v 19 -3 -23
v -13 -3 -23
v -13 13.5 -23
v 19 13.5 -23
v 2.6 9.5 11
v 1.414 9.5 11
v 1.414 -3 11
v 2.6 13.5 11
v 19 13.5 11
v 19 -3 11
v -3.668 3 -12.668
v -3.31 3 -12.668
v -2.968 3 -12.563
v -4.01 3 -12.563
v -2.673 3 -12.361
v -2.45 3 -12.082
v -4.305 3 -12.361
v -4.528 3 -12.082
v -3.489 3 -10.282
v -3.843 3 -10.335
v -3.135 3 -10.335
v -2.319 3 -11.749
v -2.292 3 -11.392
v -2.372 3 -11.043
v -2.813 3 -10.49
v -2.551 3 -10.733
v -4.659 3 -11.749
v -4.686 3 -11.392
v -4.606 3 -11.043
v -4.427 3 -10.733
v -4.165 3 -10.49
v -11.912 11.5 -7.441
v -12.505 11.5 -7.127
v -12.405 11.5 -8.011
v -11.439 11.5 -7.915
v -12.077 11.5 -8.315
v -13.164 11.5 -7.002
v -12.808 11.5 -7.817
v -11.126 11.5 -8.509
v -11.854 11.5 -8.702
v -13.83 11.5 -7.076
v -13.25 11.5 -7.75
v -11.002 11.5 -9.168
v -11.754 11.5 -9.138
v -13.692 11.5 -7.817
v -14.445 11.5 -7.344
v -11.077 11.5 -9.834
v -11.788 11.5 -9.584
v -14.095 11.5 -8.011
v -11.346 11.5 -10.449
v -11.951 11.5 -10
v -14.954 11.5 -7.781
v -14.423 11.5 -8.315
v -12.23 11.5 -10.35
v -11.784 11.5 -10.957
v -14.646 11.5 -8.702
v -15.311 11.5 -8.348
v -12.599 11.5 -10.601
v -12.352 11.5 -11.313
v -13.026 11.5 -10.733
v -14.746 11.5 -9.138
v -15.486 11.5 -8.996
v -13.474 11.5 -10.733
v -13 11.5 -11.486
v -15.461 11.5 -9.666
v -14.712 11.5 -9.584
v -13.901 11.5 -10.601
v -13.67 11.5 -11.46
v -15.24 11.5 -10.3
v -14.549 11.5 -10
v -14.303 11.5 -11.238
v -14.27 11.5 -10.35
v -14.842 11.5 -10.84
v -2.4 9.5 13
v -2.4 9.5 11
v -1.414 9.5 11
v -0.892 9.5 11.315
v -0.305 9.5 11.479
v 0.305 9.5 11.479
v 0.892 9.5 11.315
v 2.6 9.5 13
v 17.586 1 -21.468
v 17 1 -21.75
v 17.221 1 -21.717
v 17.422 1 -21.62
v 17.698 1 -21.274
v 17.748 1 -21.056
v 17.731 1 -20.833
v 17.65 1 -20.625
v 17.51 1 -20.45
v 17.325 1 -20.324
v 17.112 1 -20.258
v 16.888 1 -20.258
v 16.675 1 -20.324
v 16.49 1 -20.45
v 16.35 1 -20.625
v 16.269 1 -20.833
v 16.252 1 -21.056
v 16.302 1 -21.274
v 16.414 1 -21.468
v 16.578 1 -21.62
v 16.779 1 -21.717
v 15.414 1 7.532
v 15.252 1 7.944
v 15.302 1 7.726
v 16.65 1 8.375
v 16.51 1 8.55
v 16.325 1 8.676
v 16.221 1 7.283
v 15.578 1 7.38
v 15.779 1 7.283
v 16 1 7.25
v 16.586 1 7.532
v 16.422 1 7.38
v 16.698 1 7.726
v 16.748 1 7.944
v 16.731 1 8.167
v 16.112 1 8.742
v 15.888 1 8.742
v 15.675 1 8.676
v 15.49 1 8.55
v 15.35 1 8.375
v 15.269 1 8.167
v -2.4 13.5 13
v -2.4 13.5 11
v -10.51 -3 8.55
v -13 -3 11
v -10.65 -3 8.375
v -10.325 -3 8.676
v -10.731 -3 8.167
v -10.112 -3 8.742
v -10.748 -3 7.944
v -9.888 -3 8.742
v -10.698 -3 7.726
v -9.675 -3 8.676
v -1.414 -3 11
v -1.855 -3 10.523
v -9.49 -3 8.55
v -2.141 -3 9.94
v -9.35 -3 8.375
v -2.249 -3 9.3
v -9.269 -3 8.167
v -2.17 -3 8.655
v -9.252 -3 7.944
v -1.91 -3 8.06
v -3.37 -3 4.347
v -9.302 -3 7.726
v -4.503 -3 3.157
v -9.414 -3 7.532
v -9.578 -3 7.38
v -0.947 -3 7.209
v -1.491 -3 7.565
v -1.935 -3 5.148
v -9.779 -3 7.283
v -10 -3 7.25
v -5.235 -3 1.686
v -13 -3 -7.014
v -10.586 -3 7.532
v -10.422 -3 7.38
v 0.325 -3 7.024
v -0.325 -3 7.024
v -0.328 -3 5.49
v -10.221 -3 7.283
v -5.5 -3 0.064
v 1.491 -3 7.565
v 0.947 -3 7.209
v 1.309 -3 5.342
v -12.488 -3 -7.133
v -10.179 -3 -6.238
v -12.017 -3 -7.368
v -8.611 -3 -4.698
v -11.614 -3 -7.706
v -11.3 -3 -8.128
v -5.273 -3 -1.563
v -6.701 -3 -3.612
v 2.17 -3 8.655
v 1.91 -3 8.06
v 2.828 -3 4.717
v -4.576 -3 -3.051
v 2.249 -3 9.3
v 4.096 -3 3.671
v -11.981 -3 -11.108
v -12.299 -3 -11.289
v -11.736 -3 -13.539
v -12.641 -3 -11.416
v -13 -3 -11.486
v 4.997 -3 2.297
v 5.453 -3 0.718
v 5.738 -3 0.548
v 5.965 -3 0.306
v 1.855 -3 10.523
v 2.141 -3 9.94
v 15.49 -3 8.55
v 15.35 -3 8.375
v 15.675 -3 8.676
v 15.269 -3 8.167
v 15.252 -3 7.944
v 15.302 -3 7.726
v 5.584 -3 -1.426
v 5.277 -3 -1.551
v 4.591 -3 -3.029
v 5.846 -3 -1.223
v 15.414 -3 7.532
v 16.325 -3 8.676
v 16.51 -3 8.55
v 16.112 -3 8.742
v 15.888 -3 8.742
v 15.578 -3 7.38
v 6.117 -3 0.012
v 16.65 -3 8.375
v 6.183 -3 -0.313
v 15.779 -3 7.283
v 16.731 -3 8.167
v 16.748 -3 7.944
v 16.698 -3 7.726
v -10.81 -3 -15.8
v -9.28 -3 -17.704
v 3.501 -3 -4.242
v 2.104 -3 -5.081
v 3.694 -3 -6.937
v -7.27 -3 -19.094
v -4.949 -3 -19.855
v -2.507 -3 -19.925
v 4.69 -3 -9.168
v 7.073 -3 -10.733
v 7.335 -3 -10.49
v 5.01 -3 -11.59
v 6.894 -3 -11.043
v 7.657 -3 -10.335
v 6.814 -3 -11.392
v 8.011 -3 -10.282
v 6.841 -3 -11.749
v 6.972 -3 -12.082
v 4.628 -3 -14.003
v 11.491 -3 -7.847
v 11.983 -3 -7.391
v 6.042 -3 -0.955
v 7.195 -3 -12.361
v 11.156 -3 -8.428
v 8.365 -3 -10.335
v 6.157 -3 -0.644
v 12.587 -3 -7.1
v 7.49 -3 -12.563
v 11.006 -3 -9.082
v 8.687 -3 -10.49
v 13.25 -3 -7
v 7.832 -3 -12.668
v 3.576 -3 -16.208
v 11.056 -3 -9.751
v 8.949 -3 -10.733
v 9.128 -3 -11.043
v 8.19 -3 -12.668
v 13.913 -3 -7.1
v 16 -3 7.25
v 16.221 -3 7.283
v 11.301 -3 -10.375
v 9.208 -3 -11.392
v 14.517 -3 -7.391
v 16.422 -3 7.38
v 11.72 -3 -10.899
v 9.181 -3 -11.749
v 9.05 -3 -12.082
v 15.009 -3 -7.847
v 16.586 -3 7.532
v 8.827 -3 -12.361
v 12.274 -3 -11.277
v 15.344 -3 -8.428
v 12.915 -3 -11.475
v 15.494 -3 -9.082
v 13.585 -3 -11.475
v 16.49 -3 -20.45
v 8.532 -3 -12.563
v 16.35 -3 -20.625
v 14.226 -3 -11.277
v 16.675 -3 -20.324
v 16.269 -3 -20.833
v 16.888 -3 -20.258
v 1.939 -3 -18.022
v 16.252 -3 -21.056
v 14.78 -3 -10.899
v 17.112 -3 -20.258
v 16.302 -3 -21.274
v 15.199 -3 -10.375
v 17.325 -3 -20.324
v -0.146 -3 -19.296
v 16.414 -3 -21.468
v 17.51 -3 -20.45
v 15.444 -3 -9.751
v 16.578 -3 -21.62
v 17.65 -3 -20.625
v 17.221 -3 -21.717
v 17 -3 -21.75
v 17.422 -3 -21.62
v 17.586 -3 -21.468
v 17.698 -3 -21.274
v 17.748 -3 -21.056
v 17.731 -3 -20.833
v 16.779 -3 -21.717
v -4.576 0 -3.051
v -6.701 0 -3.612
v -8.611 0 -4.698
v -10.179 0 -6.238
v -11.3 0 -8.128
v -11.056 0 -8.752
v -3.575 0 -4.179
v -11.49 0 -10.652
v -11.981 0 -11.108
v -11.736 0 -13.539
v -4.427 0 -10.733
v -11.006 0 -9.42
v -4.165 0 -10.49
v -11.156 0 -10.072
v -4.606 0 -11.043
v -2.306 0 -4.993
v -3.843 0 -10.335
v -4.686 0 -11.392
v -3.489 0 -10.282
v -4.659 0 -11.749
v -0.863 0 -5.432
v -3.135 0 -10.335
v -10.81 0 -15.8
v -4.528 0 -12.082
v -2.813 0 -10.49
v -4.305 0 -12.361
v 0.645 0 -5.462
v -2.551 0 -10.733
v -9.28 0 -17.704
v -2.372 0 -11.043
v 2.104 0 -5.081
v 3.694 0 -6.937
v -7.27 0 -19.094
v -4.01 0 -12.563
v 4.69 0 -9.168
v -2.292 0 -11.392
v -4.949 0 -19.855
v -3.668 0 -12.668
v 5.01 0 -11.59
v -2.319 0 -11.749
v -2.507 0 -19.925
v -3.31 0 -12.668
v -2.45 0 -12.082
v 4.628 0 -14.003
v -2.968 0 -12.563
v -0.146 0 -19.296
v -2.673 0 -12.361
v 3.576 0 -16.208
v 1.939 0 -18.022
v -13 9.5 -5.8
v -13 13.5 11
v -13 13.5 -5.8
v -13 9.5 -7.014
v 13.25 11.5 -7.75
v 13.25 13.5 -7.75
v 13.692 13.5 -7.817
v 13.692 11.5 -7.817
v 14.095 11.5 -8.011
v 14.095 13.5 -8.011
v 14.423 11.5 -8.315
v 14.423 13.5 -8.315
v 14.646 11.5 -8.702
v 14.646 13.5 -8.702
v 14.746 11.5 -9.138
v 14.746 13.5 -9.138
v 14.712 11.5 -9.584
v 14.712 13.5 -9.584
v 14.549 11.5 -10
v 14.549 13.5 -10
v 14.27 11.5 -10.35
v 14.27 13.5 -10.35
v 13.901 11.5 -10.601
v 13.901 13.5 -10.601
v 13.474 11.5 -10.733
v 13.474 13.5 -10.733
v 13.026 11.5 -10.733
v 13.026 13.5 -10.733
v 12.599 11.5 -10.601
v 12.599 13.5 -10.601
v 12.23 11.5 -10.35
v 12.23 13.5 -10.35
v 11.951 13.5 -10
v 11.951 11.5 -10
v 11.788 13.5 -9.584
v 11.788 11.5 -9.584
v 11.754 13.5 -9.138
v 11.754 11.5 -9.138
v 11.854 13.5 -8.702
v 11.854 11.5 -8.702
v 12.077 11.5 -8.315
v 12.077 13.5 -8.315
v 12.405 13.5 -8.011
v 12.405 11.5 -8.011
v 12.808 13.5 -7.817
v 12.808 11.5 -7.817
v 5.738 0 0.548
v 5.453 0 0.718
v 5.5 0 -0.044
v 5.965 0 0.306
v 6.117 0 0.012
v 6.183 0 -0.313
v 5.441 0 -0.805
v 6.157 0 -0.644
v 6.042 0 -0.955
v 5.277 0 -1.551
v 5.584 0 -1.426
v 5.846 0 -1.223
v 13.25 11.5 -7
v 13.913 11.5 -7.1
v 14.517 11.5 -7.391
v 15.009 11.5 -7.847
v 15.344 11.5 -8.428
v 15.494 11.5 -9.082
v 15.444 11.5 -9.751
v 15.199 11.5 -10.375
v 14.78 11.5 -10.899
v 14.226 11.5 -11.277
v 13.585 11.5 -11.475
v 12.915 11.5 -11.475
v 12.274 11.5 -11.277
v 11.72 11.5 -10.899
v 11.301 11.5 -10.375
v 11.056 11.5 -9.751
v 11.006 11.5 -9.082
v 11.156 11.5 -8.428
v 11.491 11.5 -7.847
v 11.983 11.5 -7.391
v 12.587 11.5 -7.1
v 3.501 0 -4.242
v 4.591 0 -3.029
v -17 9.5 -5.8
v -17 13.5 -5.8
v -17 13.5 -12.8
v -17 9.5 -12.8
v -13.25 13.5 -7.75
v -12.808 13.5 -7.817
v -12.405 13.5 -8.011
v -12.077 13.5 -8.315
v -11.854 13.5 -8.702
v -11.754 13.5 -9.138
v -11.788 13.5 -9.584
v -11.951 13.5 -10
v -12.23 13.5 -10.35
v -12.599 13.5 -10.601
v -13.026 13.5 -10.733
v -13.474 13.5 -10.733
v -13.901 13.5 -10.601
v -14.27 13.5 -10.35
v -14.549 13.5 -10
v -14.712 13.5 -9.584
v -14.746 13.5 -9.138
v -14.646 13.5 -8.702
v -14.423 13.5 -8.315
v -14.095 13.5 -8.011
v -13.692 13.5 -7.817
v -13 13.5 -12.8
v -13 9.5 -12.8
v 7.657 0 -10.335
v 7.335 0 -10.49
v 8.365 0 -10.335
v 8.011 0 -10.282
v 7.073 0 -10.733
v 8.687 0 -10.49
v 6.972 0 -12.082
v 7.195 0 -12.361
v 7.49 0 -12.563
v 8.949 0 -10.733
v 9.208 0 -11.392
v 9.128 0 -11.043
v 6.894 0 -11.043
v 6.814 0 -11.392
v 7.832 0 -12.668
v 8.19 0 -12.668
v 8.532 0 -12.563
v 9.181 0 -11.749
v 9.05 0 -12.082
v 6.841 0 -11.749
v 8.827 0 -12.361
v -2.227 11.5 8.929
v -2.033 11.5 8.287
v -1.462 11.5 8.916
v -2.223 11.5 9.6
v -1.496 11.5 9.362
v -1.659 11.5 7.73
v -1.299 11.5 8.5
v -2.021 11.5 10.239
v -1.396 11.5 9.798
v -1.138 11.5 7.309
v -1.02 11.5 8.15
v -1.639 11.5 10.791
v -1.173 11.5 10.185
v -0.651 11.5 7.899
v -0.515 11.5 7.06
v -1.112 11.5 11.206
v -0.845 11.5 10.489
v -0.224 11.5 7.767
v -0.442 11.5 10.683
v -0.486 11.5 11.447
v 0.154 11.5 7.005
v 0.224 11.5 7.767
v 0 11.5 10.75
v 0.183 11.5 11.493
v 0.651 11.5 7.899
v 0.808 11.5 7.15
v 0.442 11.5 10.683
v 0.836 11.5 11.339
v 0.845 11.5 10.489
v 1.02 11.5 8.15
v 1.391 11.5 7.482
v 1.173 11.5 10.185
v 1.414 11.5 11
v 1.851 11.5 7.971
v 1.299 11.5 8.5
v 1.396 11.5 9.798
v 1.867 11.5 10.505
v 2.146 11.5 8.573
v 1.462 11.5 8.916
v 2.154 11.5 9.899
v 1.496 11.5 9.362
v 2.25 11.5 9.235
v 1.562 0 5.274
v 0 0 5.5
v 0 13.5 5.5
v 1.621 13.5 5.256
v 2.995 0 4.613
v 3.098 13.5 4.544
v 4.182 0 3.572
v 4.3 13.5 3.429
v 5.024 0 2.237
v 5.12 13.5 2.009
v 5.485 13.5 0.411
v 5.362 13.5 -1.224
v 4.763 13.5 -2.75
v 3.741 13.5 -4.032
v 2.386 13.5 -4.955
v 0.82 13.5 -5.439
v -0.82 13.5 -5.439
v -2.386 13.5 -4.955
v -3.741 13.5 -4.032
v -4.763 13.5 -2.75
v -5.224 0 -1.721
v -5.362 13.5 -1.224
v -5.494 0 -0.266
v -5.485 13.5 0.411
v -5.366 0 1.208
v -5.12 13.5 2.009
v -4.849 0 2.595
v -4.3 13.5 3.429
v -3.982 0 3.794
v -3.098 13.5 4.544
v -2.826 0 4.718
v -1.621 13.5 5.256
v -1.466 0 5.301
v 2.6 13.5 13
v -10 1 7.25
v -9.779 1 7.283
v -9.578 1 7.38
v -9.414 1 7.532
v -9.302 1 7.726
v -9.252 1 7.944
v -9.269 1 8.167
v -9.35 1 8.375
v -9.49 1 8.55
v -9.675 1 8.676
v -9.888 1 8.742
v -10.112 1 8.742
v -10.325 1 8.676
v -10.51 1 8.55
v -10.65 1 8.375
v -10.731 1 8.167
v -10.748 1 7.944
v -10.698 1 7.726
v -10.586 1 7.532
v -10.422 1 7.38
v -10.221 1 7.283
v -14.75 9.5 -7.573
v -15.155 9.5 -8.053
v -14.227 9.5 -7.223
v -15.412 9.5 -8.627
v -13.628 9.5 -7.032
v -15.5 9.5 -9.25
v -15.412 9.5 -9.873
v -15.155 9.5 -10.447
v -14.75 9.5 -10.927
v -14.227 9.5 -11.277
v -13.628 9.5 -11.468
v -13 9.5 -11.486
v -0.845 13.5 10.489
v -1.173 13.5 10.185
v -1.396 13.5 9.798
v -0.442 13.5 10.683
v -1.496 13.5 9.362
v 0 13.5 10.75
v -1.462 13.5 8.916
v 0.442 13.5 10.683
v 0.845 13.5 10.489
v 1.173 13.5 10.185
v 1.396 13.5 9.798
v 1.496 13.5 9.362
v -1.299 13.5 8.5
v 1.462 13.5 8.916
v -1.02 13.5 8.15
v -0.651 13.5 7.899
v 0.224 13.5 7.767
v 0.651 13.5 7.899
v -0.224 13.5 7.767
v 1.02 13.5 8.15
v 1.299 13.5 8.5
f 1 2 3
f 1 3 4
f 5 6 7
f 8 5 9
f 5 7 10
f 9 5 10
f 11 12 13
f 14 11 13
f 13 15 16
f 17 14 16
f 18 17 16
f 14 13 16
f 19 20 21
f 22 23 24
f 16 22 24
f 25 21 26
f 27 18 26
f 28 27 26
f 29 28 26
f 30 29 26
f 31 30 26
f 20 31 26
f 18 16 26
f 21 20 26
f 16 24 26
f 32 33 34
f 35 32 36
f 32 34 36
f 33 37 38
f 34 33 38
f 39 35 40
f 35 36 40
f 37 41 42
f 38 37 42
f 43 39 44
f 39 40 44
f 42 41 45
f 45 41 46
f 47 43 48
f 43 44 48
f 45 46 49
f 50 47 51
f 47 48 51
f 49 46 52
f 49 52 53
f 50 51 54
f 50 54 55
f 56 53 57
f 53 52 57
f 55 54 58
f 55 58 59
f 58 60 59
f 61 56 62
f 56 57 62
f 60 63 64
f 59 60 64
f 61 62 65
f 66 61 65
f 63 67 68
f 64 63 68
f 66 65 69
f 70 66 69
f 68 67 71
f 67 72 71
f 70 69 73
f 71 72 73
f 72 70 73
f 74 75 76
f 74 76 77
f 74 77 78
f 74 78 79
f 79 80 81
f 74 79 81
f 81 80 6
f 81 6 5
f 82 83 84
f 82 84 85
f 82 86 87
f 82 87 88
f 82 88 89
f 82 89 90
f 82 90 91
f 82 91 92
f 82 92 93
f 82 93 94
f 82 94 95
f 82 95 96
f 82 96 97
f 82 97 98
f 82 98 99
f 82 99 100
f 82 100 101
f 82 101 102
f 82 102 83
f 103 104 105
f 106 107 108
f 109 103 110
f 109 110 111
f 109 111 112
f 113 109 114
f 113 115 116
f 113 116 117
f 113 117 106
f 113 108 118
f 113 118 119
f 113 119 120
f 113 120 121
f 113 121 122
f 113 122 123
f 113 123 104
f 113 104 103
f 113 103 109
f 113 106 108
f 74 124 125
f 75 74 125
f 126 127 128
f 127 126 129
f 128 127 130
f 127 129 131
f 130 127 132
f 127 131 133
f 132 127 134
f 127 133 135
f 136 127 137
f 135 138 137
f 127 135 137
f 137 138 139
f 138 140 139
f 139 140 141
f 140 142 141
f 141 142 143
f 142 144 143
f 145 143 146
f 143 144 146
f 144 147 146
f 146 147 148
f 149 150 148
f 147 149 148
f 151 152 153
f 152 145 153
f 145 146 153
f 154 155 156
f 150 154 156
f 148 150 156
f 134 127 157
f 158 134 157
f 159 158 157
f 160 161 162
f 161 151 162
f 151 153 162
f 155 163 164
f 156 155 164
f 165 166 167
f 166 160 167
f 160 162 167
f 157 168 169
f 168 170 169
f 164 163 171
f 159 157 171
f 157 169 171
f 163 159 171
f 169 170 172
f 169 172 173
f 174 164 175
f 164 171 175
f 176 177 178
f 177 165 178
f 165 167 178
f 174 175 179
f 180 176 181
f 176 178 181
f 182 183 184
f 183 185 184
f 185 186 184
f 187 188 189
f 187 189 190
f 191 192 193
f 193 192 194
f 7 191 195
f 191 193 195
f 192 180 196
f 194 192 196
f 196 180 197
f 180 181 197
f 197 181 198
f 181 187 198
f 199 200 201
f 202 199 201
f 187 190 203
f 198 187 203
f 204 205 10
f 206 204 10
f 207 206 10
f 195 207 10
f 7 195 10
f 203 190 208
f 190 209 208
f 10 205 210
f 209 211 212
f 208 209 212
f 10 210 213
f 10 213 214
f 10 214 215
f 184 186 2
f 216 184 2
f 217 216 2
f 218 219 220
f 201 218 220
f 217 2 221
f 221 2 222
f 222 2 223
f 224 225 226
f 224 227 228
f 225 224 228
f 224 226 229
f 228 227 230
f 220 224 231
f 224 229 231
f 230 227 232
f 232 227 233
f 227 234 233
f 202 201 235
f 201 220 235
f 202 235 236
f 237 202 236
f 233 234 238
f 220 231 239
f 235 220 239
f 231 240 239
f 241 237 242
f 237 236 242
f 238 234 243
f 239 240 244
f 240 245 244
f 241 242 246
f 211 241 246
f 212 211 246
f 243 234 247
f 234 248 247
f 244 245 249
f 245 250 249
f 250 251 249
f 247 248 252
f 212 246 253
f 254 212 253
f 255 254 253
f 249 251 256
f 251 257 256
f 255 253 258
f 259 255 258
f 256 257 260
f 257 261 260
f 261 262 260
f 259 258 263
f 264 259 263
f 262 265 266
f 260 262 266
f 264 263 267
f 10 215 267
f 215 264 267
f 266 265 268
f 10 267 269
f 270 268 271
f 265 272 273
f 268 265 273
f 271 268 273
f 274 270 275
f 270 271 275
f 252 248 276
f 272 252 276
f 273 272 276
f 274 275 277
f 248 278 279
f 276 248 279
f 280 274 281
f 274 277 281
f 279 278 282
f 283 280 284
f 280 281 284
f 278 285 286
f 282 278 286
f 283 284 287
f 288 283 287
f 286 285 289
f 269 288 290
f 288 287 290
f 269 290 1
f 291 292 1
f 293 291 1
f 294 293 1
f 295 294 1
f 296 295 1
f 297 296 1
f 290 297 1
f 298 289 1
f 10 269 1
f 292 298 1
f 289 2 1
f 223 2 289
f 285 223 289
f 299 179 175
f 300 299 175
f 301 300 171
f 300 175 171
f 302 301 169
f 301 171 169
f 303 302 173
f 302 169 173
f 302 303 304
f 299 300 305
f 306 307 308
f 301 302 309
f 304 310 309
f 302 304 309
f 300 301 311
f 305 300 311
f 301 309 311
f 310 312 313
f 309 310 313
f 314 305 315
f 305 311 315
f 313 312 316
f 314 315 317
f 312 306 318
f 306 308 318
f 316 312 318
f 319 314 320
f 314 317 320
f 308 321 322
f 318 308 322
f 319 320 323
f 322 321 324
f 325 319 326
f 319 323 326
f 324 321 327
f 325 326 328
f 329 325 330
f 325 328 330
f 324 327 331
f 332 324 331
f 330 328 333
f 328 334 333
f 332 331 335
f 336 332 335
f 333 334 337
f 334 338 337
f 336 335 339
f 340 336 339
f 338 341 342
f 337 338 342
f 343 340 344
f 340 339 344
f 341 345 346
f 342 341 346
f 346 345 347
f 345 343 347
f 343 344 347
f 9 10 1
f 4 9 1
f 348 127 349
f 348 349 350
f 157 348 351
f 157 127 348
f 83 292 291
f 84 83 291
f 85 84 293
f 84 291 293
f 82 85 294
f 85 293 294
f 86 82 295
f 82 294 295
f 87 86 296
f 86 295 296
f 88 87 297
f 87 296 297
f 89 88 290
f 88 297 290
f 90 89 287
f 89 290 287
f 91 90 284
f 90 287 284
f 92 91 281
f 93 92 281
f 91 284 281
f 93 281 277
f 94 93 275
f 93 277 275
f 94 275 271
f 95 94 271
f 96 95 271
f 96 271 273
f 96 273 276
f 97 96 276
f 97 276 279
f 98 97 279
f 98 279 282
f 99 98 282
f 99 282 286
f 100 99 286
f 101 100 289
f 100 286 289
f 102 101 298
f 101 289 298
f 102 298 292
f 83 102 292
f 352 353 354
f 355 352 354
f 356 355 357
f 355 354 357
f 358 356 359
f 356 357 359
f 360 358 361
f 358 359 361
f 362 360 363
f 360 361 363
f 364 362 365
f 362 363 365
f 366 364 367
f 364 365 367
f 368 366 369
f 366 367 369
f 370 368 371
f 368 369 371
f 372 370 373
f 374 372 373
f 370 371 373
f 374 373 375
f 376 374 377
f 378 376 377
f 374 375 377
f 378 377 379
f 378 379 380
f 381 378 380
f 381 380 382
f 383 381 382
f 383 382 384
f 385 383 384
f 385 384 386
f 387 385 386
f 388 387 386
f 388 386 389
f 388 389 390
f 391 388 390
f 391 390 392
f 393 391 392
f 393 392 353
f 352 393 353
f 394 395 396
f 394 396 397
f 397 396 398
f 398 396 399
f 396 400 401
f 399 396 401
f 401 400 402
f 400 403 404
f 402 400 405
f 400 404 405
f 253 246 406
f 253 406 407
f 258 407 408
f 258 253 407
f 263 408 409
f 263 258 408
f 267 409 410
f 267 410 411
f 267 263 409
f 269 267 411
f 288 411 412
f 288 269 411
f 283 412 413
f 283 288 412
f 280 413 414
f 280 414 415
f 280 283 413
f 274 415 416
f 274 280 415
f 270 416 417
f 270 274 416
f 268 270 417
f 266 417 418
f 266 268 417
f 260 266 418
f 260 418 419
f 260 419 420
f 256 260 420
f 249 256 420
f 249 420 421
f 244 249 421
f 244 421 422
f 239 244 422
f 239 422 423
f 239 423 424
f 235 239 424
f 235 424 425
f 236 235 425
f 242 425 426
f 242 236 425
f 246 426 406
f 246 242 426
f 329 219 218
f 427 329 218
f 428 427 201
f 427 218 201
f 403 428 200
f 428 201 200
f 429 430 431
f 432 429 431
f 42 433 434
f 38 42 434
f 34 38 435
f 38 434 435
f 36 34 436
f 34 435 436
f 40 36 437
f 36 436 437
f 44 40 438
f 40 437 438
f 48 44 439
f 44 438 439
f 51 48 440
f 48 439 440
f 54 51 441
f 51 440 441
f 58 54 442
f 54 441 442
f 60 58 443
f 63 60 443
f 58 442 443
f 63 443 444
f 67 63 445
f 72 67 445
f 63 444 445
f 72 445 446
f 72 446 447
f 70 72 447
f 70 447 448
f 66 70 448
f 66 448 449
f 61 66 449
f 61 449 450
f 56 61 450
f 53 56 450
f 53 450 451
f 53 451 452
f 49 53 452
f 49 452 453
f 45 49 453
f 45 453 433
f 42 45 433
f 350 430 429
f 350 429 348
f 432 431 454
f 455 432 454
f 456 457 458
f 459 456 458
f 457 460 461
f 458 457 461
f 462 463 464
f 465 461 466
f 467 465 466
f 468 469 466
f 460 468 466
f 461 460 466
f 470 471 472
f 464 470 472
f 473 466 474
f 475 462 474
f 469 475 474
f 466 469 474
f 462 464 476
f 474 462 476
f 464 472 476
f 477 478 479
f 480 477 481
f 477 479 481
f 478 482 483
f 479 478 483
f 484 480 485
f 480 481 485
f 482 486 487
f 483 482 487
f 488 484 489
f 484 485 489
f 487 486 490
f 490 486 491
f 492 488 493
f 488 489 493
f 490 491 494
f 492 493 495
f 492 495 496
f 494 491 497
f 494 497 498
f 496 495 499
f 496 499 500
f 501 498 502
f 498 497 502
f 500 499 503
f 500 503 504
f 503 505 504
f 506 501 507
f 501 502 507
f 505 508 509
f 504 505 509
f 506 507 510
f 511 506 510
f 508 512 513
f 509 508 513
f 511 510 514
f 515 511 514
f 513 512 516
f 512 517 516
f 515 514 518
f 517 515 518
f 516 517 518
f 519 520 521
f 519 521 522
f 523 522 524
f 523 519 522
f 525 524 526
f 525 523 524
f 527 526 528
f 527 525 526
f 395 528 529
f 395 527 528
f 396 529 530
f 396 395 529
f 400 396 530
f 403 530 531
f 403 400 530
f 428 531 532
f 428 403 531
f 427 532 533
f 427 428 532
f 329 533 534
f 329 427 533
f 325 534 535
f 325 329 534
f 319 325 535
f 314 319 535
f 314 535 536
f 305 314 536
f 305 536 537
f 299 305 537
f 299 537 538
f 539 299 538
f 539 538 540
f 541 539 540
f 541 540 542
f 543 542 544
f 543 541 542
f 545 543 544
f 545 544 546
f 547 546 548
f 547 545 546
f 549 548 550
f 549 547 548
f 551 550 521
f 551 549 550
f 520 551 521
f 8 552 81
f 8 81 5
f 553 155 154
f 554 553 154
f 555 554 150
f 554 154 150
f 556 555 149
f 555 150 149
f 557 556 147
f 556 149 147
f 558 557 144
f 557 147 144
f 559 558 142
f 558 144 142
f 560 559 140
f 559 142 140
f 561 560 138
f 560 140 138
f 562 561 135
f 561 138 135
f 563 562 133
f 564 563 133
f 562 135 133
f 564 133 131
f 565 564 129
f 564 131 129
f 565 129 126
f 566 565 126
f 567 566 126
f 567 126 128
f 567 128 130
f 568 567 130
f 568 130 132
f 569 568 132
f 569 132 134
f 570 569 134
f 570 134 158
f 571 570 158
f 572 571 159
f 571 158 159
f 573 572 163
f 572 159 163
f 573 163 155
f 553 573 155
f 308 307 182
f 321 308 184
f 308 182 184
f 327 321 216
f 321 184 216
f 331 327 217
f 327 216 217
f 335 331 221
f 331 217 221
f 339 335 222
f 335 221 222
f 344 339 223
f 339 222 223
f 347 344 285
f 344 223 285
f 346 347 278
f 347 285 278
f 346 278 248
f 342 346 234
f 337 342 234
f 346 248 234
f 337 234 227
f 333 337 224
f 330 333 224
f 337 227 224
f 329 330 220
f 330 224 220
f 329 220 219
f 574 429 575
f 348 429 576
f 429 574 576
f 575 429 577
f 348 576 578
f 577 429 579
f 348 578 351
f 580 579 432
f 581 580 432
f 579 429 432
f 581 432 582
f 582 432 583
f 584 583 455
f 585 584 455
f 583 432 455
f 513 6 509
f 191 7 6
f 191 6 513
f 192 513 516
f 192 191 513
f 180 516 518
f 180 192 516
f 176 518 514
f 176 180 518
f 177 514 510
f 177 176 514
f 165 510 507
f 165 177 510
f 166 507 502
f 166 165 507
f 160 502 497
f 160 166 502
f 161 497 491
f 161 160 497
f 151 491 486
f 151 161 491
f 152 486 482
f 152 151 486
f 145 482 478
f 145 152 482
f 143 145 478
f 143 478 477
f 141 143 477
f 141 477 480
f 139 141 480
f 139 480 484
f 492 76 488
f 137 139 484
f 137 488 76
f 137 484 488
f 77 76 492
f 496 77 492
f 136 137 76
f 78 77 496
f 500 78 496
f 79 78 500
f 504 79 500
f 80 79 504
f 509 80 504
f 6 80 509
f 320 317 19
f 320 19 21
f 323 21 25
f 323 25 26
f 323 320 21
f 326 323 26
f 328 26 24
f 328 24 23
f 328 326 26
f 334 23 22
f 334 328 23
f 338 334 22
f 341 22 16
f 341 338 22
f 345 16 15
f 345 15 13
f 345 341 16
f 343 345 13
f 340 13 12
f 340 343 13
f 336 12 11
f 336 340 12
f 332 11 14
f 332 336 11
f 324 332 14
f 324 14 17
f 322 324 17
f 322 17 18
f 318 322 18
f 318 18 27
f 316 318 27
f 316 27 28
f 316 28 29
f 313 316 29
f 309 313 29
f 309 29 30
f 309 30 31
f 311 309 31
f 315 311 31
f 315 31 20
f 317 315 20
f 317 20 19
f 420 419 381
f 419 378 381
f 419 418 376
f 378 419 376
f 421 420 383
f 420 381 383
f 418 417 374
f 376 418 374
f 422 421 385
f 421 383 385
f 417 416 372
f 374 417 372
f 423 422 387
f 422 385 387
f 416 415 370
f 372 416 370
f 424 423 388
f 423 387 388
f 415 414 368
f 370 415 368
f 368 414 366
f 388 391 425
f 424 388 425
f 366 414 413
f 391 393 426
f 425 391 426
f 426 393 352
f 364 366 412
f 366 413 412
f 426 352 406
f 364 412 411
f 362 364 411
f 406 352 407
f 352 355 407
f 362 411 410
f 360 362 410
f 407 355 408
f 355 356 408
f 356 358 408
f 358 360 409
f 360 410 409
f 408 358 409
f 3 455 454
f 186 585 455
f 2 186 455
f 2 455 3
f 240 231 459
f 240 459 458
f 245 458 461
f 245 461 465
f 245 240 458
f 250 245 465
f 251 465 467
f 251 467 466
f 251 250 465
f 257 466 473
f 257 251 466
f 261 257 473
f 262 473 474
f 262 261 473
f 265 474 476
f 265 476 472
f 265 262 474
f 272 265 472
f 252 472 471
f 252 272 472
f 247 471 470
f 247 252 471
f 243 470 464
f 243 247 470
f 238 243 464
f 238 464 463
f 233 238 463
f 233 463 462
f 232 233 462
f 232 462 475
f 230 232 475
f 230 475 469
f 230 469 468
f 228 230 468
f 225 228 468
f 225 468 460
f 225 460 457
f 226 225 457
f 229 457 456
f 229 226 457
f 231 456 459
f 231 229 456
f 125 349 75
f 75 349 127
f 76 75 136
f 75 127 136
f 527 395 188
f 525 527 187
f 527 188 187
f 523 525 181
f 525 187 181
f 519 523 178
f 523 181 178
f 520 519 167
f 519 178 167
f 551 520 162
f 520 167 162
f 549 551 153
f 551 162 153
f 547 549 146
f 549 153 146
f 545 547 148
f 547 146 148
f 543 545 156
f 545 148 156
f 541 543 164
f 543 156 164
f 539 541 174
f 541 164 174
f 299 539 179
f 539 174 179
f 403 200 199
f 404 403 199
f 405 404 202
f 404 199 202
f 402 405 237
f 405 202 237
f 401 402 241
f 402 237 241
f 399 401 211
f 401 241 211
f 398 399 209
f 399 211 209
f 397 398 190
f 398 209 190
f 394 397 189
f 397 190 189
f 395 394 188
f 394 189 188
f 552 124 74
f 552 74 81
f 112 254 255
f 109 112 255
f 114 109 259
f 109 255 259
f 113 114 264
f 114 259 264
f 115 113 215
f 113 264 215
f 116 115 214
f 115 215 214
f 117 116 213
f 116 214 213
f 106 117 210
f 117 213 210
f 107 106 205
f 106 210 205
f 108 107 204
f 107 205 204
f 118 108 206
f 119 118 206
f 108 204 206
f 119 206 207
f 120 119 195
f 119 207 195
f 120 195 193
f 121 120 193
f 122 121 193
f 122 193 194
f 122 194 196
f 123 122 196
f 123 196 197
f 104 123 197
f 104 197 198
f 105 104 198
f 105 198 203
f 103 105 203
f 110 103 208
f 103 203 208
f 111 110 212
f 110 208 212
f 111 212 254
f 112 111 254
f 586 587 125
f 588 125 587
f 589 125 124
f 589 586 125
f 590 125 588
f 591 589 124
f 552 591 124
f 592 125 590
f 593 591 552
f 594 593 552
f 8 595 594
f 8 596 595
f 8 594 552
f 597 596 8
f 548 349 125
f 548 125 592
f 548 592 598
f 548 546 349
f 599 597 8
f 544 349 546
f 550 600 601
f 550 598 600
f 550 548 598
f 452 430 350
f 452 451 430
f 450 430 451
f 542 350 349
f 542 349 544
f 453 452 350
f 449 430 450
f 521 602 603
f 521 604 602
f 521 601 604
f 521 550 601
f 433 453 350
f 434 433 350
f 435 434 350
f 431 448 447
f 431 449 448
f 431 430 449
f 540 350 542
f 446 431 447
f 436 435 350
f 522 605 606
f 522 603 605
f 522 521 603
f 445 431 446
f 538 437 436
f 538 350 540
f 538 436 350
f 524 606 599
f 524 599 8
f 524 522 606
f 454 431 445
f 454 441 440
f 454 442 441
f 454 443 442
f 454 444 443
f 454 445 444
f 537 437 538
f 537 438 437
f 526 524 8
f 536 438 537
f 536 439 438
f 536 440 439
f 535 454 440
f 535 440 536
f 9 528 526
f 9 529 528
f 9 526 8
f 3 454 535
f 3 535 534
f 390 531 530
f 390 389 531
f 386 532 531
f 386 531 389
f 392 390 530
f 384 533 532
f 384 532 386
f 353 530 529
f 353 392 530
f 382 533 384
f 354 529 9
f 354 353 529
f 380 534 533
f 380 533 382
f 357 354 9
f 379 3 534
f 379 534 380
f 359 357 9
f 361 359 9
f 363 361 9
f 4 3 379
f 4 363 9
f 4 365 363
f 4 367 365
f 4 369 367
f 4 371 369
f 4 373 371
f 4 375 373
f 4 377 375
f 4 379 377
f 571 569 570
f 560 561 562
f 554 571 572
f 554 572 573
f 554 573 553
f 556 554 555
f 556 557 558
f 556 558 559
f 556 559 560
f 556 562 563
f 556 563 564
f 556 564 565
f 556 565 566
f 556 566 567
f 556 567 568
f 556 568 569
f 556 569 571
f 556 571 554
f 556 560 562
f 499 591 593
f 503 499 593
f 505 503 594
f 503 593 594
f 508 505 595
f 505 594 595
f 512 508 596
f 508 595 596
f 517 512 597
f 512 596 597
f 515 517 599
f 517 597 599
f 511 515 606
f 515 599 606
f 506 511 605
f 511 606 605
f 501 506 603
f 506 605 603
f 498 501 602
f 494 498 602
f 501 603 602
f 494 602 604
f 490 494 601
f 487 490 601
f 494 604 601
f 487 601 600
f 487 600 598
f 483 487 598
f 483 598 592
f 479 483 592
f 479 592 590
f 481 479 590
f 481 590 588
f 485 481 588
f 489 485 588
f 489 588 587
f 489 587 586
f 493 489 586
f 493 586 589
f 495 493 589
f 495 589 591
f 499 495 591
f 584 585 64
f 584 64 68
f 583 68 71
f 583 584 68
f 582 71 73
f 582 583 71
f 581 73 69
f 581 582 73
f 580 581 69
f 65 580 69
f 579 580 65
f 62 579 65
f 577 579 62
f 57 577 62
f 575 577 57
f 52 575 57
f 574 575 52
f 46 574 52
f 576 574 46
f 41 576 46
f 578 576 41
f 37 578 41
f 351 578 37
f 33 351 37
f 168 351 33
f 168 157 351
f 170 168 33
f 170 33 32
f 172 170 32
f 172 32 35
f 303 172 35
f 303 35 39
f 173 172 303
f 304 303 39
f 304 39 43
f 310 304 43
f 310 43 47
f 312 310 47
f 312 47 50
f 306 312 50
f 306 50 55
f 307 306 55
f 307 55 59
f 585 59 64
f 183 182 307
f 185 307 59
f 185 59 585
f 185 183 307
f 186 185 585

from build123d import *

# Parameters (mm, degrees)
SKETCH_1_W          = 32
SKETCH_1_H          = 34
SKETCH_1_R          = 3.388194149
SKETCH_1_R_2        = 1.2
SKETCH_1_R_3        = 5.5
EXTRUDE_1_DEPTH     = 13.5
EXTRUDE_START       = 3
SKETCH_1_26_R       = 1.2
EXTRUDE_3_DEPTH     = 10.5
EXTRUDE_START_2     = -3
SKETCH_1_25_W       = 32
SKETCH_1_25_H       = 34
SKETCH_1_25_R       = 3.388194149
SKETCH_1_25_R_2     = 1.2
EXTRUDE_2_DEPTH     = 3
SKETCH_2_W          = 4
SKETCH_2_H          = 7
SKETCH_2_W_2        = 5
SKETCH_2_H_2        = 2
EXTRUDE_4_DEPTH     = 4
SKETCH_2_3_R        = 1.5
CUT_EXTRUDE_1_DEPTH = 35.091787867
CUT_EXTRUDE_START   = -16.5
SKETCH_2_4_R        = 2.25
CUT_EXTRUDE_2_DEPTH = 14.5
SKETCH_3_R          = 0.75
CUT_EXTRUDE_3_DEPTH = 4
SKETCH_1_27_R       = 3.388194149
EXTRUDE_5_DEPTH     = 16.5


with BuildPart() as part:
    # 草图1 → 凸台-拉伸1 (new body)
    with BuildSketch(Plane(origin=(0, 0, 0), x_dir=(1, 0, 0), z_dir=(0, 1, 0))):
        with Locations((3, 6)):
            Rectangle(SKETCH_1_W, SKETCH_1_H)
        with Locations(Location((11.473501894, 0, 0), (0, 0, 270))):
            Circle(SKETCH_1_R, mode=Mode.SUBTRACT)
        with Locations(Location((-3.489130435, 11.48154906, 0), (0, 0, 270))):
            Circle(SKETCH_1_R_2, mode=Mode.SUBTRACT)
        with Locations(Location((0, 0, 0), (0, 0, 270))):
            Circle(SKETCH_1_R_3, mode=Mode.SUBTRACT)
    extrude(amount=EXTRUDE_1_DEPTH)

    # 草图1<26> → 凸台-拉伸3 (add)
    with BuildSketch(Plane(origin=(0, 0, 0), x_dir=(1, 0, 0), z_dir=(0, 1, 0)).offset(EXTRUDE_START)):
        with Locations(Location((-3.489130435, 11.48154906, 0), (0, 0, 270))):
            Circle(SKETCH_1_26_R)
    extrude(amount=EXTRUDE_3_DEPTH)

    # 草图1<25> → 凸台-拉伸2 (add)
    with BuildSketch(Plane(origin=(0, 0, 0), x_dir=(1, 0, 0), z_dir=(0, 1, 0)).offset(EXTRUDE_START_2)):
        with Locations((3, 6)):
            Rectangle(SKETCH_1_25_W, SKETCH_1_25_H)
        with Locations(Location((11.473501894, 0, 0), (0, 0, 270))):
            Circle(SKETCH_1_25_R, mode=Mode.SUBTRACT)
        with BuildLine():
            ThreePointArc((5.276856444, 1.550737267), (6.181423335, 0.479588939), (5.452898061, -0.718263692))
            ThreePointArc((5.452898061, -0.718263692), (-1.935120147, -5.148330799), (-4.575965094, 3.051318314))
            ThreePointArc((-4.575965094, 3.051318314), (-5.960597826, 19.614312977), (2.104497703, 5.081445603))
            ThreePointArc((2.104497703, 5.081445603), (4.091157856, 3.67592538), (5.276856444, 1.550737267))
        make_face(mode=Mode.SUBTRACT)
        with Locations(Location((8.010869565, 11.48154906, 0), (0, 0, 270))):
            Circle(SKETCH_1_25_R_2, mode=Mode.SUBTRACT)
    extrude(amount=EXTRUDE_2_DEPTH)

    # 草图2 → 凸台-拉伸4 (add)
    with BuildSketch(Plane(origin=(0, 13.5, 0), x_dir=(1, 0, 0), z_dir=(0, 1, 0))):
        with Locations((-15, 9.3)):
            Rectangle(SKETCH_2_W, SKETCH_2_H)
        with Locations((0.1, -12)):
            Rectangle(SKETCH_2_W_2, SKETCH_2_H_2)
    extrude(amount=-EXTRUDE_4_DEPTH)

    # 草图2<3> → 切除-拉伸1 (cut, through all)
    with BuildSketch(Plane(origin=(0, 13.5, 0), x_dir=(1, 0, 0), z_dir=(0, 1, 0))):
        with Locations(Location((-13.25, 9.25, 0), (0, 0, 270))):
            Circle(SKETCH_2_3_R)
        with Locations(Location((0, -9.25, 0), (0, 0, 270))):
            Circle(SKETCH_2_3_R)
        with Locations(Location((13.25, 9.25, 0), (0, 0, 270))):
            Circle(SKETCH_2_3_R)
    extrude(amount=-CUT_EXTRUDE_1_DEPTH, mode=Mode.SUBTRACT)

    # 草图2<4> → 切除-拉伸2 (cut)
    with BuildSketch(Plane(origin=(0, 13.5, 0), x_dir=(1, 0, 0), z_dir=(0, 1, 0)).offset(CUT_EXTRUDE_START)):
        with Locations(Location((-13.25, 9.25, 0), (0, 0, 83.620629792))):
            Circle(SKETCH_2_4_R)
        with Locations(Location((13.25, 9.25, 0), (0, 0, 270))):
            Circle(SKETCH_2_4_R)
        with Locations(Location((0, -9.25, 0), (0, 0, 308.942441269))):
            Circle(SKETCH_2_4_R)
    extrude(amount=CUT_EXTRUDE_2_DEPTH, mode=Mode.SUBTRACT)

    # 草图3 → 切除-拉伸3 (cut)
    with BuildSketch(Plane.XZ.offset(3)):
        with Locations(Location((-10, 8, 0), (0, 0, 270))):
            Circle(SKETCH_3_R)
        with Locations(Location((17, -21, 0), (0, 0, 270))):
            Circle(SKETCH_3_R)
        with Locations(Location((16, 8, 0), (0, 0, 270))):
            Circle(SKETCH_3_R)
    extrude(amount=-CUT_EXTRUDE_3_DEPTH, mode=Mode.SUBTRACT)

    # 草图1<27> → 凸台-拉伸5 (add, through all)
    with BuildSketch(Plane(origin=(0, 0, 0), x_dir=(1, 0, 0), z_dir=(0, 1, 0)).offset(EXTRUDE_START_2)):
        with Locations((11.473501894, 0)):
            Circle(SKETCH_1_27_R)
    extrude(amount=EXTRUDE_5_DEPTH)


solid = part.part
